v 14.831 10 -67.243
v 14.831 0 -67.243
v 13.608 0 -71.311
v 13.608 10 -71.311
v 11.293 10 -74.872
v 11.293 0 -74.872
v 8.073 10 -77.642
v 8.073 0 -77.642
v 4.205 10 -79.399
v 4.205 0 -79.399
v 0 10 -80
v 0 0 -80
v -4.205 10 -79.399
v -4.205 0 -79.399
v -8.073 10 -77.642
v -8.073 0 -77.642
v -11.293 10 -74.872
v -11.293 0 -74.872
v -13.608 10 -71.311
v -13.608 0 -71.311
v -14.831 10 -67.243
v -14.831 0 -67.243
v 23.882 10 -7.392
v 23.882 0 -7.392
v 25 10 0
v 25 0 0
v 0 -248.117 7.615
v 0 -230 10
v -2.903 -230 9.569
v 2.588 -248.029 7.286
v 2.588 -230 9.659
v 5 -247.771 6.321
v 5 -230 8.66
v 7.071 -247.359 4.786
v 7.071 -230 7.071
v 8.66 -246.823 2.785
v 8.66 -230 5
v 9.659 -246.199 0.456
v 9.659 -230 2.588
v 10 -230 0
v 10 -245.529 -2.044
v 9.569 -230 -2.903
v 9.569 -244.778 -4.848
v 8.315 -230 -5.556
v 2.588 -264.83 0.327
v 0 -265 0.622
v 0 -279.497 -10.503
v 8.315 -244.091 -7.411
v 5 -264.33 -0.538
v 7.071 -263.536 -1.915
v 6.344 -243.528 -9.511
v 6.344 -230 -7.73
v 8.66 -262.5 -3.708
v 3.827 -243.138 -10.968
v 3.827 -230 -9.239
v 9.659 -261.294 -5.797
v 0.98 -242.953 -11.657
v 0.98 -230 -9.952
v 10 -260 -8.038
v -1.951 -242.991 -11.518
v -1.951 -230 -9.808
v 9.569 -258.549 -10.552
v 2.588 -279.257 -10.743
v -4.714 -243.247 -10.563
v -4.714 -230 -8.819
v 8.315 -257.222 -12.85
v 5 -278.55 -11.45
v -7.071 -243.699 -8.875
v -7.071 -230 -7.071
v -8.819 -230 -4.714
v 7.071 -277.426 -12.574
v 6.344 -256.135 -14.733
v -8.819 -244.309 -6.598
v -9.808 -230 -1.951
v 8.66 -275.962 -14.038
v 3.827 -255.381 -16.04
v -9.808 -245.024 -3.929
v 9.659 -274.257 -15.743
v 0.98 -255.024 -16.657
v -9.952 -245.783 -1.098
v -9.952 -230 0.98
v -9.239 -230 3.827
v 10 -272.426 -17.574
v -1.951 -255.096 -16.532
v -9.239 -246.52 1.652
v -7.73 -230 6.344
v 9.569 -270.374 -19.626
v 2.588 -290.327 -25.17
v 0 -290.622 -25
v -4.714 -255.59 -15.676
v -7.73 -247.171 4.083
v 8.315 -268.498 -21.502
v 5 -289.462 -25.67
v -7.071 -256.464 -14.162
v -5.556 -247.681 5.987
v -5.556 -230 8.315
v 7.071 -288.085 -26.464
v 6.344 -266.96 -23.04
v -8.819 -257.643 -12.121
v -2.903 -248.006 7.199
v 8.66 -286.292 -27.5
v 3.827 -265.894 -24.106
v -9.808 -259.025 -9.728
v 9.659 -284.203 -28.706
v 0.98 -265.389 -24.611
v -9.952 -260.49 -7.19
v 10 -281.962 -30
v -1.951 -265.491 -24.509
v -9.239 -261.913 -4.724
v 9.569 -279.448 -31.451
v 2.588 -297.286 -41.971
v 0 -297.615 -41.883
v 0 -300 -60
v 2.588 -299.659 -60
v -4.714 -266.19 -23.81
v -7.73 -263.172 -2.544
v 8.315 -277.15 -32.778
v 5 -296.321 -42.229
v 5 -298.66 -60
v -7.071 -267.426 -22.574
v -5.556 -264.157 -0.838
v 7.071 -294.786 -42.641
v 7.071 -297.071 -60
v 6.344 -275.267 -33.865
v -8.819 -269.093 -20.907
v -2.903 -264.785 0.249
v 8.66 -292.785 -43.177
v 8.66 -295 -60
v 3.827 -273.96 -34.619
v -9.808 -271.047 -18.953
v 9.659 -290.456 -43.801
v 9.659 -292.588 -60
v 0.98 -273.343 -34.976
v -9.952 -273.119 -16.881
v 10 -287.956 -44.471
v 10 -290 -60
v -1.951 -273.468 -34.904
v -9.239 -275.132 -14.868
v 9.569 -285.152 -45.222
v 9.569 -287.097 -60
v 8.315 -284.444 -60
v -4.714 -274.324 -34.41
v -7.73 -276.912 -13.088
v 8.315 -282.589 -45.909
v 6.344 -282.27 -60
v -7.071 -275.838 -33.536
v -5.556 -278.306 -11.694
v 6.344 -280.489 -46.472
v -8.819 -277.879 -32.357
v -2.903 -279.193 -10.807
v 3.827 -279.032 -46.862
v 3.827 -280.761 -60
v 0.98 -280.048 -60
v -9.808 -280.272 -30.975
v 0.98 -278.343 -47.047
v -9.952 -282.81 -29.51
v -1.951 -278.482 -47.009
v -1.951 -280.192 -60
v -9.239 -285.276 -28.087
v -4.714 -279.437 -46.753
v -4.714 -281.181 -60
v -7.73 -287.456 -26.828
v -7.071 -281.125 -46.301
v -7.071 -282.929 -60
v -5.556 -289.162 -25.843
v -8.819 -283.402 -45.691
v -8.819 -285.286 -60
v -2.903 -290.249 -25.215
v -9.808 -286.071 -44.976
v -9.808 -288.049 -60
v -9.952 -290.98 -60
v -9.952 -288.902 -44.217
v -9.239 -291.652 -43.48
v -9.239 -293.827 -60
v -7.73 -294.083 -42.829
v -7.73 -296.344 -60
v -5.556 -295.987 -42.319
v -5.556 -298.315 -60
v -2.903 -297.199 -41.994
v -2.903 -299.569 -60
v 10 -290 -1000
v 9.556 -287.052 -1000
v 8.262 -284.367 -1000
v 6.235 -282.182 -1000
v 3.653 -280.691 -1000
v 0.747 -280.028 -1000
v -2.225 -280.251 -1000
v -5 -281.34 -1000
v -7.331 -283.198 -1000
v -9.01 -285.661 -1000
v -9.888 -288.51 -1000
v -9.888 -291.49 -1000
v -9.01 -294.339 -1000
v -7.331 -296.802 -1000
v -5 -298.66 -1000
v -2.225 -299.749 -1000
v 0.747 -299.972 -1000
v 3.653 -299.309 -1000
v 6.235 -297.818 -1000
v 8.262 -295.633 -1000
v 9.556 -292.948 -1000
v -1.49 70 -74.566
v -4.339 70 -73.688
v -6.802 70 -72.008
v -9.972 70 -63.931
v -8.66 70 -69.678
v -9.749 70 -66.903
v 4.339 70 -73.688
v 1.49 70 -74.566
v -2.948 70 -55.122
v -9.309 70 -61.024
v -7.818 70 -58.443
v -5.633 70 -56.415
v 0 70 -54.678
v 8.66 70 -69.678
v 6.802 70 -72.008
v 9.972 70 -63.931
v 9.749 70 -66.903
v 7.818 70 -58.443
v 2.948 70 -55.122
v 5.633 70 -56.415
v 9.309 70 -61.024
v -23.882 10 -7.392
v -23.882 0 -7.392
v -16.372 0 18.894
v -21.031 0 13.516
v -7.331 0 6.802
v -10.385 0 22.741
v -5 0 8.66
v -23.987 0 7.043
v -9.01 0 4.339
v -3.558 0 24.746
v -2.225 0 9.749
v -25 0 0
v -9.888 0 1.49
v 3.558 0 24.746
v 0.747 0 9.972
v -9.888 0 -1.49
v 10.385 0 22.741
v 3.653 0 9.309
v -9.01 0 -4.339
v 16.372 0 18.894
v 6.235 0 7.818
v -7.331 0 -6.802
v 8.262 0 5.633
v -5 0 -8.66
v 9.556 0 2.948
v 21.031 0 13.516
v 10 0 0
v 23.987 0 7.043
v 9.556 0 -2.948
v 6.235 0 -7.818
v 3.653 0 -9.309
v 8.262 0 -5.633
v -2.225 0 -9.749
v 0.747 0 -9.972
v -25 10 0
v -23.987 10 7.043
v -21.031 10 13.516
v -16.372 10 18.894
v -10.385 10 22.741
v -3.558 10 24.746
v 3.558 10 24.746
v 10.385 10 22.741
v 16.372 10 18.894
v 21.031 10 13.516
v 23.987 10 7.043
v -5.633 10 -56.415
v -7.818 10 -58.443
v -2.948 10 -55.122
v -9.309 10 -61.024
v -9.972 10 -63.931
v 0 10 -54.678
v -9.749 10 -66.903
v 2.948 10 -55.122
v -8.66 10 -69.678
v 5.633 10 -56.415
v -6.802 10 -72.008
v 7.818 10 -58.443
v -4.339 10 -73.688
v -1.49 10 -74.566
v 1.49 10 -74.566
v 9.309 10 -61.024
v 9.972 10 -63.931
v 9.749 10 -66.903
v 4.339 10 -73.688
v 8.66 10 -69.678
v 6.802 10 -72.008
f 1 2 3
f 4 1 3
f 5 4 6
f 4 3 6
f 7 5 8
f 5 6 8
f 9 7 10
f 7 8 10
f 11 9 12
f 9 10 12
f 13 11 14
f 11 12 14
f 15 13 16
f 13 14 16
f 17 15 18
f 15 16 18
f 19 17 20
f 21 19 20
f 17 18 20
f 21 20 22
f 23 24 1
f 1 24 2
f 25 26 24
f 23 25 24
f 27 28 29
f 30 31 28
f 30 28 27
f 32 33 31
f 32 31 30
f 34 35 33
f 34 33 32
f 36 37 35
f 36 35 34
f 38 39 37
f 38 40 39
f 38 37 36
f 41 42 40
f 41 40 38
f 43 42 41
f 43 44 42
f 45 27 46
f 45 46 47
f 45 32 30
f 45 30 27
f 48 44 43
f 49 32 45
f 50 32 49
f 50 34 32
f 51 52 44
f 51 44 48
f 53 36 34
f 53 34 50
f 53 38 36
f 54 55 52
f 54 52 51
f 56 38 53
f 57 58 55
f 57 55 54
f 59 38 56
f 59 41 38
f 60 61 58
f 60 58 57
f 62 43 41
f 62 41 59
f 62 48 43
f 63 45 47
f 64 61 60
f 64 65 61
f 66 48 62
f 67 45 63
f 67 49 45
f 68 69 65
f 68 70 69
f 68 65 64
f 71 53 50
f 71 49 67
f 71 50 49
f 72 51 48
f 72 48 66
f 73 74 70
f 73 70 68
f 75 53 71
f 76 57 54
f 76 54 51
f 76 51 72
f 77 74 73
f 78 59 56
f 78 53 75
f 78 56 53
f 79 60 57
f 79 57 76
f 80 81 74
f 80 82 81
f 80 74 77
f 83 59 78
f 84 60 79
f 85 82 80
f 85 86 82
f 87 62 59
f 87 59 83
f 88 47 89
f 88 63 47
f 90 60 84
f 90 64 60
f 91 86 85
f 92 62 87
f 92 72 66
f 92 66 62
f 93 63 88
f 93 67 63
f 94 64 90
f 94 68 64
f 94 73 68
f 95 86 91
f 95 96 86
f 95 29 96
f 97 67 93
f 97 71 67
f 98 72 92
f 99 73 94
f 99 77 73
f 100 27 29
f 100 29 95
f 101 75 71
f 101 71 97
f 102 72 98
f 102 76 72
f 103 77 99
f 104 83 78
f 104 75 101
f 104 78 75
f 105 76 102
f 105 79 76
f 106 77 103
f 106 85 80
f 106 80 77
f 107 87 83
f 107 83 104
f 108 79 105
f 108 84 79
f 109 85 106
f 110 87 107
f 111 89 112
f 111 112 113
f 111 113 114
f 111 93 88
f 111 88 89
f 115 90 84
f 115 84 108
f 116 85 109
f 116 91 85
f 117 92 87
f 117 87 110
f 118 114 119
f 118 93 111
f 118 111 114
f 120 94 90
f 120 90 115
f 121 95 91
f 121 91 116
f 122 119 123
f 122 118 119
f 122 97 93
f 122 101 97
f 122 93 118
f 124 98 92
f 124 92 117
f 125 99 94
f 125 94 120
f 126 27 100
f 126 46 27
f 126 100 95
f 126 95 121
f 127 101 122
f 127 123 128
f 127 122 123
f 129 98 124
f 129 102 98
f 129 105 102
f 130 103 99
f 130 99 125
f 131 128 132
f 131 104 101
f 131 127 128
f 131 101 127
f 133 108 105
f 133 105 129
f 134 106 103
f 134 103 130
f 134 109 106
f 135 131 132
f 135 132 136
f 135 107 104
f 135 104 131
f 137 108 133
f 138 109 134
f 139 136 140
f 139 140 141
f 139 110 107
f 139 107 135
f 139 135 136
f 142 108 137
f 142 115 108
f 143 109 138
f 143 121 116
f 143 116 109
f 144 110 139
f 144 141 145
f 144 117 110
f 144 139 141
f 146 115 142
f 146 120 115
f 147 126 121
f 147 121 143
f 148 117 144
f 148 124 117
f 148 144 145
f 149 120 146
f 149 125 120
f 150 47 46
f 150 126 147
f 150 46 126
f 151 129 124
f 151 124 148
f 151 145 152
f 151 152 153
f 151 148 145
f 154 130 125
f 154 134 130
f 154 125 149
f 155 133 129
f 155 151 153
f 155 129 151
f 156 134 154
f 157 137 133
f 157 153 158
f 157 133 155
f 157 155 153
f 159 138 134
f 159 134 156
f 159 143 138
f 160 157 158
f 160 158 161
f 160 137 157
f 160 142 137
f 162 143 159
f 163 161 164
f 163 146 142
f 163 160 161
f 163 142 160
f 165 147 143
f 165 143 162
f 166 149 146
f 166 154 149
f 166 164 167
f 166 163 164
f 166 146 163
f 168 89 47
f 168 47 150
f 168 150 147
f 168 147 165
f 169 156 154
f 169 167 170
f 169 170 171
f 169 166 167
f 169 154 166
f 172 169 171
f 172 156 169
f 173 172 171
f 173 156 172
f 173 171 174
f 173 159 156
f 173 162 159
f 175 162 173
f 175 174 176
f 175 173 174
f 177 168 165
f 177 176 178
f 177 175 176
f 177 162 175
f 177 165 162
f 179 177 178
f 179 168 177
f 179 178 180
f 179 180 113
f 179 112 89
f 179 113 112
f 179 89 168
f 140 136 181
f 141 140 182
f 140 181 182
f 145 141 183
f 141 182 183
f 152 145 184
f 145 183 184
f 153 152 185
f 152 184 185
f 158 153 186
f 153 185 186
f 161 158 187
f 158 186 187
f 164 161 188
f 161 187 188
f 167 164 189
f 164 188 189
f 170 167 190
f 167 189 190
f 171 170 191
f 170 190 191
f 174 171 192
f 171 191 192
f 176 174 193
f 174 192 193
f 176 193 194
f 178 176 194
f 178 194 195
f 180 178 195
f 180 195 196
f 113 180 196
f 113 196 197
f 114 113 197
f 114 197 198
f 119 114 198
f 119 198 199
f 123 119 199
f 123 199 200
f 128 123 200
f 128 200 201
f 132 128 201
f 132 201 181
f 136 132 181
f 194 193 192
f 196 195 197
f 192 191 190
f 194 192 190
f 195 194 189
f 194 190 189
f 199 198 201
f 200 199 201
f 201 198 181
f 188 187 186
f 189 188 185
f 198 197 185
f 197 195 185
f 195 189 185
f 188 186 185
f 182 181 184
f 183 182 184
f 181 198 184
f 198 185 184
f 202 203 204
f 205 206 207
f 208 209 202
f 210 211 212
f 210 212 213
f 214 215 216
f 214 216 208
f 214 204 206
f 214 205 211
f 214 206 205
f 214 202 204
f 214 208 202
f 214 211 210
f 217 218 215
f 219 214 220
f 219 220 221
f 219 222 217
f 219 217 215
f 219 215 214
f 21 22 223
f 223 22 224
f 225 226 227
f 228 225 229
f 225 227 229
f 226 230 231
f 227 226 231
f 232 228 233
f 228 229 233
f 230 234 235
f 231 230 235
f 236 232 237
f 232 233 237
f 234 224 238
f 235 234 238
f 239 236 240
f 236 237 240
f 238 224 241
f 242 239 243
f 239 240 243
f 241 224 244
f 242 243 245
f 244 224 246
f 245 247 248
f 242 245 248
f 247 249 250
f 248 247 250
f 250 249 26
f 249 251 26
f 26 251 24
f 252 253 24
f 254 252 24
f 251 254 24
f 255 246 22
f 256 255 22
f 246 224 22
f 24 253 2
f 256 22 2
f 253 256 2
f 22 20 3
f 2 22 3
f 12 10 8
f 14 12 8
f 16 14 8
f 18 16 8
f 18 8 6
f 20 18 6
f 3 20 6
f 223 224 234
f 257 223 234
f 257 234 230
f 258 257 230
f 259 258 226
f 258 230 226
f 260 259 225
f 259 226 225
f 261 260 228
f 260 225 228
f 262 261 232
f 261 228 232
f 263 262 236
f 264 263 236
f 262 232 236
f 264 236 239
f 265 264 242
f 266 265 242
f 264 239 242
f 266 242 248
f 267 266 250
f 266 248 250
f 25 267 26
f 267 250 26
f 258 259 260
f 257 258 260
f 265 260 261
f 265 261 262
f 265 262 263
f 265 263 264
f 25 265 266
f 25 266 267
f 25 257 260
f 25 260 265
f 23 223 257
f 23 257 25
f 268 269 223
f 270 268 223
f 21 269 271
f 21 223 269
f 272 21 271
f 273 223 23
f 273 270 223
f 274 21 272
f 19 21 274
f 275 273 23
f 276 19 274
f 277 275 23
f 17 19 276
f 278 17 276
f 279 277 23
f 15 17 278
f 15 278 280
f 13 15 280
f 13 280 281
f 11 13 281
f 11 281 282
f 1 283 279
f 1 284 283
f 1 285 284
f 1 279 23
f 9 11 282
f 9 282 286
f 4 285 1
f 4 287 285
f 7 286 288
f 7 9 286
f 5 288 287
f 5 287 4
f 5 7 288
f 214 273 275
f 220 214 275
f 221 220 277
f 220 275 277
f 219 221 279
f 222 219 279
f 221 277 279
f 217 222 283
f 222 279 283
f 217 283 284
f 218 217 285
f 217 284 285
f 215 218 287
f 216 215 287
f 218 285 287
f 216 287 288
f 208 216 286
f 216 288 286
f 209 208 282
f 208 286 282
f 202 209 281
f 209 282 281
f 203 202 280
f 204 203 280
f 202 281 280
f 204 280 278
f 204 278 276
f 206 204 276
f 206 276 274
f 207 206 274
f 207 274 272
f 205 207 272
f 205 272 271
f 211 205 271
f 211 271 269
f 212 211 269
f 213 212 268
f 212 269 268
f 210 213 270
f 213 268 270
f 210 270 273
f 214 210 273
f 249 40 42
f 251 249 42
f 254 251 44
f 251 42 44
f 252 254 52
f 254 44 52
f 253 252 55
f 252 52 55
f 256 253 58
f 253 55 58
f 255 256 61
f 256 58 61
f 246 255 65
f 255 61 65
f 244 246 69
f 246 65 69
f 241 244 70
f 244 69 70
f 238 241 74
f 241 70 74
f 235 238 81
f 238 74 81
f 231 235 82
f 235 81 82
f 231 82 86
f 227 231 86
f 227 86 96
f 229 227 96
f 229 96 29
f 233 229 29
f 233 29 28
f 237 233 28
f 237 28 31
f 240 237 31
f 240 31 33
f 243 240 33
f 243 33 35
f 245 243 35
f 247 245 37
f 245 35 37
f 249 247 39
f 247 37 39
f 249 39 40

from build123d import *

# Parameters (mm, degrees)
SKETCH1_R           = 10
BOSS_EXTRUDE1_DEPTH = 10
SKETCH2_R           = 10
BOSS_EXTRUDE2_DEPTH = 60
SWEEP1_START        = -1000
SWEEP1_OUTLINE_R    = 10
SWEEP1_DEPTH        = 940
SWEEP1_START_2      = -230.0000001
SWEEP1_2_OUTLINE_R  = 10
SWEEP1_2_DEPTH      = 240.0000001
SWEEP1_3_OUTLINE_R  = 10
SWEEP1_3_ANGLE      = 90


with BuildPart() as part:
    # Sketch1 → Boss-Extrude1 (new body)
    with BuildSketch(Plane(origin=(0, 0, 0), x_dir=(1, 0, 0), z_dir=(0, 1, 0))):
        with BuildLine():
            ThreePointArc((14.831374996, 67.242836537), (0, 80), (-14.831374996, 67.242836537))
            Line((-14.831374996, 67.242836537), (-23.88215206, 7.392077718))
            Line((-23.88215206, 7.392077718), (-25, 0))
            ThreePointArc((-25, 0), (0, -25), (25, 0))
            Line((25, 0), (23.88215206, 7.392077718))
            Line((23.88215206, 7.392077718), (14.831374996, 67.242836537))
        make_face()
        with Locations(Location((0, 0, 0), (0, 0, 270))):
            Circle(SKETCH1_R, mode=Mode.SUBTRACT)
    extrude(amount=BOSS_EXTRUDE1_DEPTH)

    # Sketch2 → Boss-Extrude2 (add)
    with BuildSketch(Plane(origin=(0, 10, 0), x_dir=(1, 0, 0), z_dir=(0, 1, 0))):
        with Locations(Location((0, 64.677844525, 0), (0, 0, 270))):
            Circle(SKETCH2_R)
    extrude(amount=BOSS_EXTRUDE2_DEPTH)

    # Sweep1 2 outline → Sweep1 2 (add)
    with BuildSketch(Plane(origin=(0, 0, 0), x_dir=(1, 0, 0), z_dir=(0, 1, 0)).offset(SWEEP1_START_2)):
        Circle(SWEEP1_2_OUTLINE_R)
    extrude(amount=SWEEP1_2_DEPTH)



with BuildPart() as body_2:
    # Sweep1: read off the stored shape, not the designer's step
    # Sweep1 outline → Sweep1 (new body)
    with BuildSketch(Plane.XY.offset(SWEEP1_START)):
        with Locations((0, -290)):
            Circle(SWEEP1_OUTLINE_R)
    extrude(amount=SWEEP1_DEPTH)


with BuildPart() as part_1:
    add(part.part)

    add(body_2.part)  # Sweep1 3 merges body 2
    # Sweep1 3 outline → Sweep1 3 (revolve)
    with BuildSketch(Plane(origin=(0, -230, -60), x_dir=(0, 0, 1), z_dir=(0, 1, 0))):
        with Locations((60, 0)):
            Circle(SWEEP1_3_OUTLINE_R)
    revolve(axis=Axis((0, -230, -60), (1, 0, 0)), revolution_arc=SWEEP1_3_ANGLE)


solid = part_1.part
